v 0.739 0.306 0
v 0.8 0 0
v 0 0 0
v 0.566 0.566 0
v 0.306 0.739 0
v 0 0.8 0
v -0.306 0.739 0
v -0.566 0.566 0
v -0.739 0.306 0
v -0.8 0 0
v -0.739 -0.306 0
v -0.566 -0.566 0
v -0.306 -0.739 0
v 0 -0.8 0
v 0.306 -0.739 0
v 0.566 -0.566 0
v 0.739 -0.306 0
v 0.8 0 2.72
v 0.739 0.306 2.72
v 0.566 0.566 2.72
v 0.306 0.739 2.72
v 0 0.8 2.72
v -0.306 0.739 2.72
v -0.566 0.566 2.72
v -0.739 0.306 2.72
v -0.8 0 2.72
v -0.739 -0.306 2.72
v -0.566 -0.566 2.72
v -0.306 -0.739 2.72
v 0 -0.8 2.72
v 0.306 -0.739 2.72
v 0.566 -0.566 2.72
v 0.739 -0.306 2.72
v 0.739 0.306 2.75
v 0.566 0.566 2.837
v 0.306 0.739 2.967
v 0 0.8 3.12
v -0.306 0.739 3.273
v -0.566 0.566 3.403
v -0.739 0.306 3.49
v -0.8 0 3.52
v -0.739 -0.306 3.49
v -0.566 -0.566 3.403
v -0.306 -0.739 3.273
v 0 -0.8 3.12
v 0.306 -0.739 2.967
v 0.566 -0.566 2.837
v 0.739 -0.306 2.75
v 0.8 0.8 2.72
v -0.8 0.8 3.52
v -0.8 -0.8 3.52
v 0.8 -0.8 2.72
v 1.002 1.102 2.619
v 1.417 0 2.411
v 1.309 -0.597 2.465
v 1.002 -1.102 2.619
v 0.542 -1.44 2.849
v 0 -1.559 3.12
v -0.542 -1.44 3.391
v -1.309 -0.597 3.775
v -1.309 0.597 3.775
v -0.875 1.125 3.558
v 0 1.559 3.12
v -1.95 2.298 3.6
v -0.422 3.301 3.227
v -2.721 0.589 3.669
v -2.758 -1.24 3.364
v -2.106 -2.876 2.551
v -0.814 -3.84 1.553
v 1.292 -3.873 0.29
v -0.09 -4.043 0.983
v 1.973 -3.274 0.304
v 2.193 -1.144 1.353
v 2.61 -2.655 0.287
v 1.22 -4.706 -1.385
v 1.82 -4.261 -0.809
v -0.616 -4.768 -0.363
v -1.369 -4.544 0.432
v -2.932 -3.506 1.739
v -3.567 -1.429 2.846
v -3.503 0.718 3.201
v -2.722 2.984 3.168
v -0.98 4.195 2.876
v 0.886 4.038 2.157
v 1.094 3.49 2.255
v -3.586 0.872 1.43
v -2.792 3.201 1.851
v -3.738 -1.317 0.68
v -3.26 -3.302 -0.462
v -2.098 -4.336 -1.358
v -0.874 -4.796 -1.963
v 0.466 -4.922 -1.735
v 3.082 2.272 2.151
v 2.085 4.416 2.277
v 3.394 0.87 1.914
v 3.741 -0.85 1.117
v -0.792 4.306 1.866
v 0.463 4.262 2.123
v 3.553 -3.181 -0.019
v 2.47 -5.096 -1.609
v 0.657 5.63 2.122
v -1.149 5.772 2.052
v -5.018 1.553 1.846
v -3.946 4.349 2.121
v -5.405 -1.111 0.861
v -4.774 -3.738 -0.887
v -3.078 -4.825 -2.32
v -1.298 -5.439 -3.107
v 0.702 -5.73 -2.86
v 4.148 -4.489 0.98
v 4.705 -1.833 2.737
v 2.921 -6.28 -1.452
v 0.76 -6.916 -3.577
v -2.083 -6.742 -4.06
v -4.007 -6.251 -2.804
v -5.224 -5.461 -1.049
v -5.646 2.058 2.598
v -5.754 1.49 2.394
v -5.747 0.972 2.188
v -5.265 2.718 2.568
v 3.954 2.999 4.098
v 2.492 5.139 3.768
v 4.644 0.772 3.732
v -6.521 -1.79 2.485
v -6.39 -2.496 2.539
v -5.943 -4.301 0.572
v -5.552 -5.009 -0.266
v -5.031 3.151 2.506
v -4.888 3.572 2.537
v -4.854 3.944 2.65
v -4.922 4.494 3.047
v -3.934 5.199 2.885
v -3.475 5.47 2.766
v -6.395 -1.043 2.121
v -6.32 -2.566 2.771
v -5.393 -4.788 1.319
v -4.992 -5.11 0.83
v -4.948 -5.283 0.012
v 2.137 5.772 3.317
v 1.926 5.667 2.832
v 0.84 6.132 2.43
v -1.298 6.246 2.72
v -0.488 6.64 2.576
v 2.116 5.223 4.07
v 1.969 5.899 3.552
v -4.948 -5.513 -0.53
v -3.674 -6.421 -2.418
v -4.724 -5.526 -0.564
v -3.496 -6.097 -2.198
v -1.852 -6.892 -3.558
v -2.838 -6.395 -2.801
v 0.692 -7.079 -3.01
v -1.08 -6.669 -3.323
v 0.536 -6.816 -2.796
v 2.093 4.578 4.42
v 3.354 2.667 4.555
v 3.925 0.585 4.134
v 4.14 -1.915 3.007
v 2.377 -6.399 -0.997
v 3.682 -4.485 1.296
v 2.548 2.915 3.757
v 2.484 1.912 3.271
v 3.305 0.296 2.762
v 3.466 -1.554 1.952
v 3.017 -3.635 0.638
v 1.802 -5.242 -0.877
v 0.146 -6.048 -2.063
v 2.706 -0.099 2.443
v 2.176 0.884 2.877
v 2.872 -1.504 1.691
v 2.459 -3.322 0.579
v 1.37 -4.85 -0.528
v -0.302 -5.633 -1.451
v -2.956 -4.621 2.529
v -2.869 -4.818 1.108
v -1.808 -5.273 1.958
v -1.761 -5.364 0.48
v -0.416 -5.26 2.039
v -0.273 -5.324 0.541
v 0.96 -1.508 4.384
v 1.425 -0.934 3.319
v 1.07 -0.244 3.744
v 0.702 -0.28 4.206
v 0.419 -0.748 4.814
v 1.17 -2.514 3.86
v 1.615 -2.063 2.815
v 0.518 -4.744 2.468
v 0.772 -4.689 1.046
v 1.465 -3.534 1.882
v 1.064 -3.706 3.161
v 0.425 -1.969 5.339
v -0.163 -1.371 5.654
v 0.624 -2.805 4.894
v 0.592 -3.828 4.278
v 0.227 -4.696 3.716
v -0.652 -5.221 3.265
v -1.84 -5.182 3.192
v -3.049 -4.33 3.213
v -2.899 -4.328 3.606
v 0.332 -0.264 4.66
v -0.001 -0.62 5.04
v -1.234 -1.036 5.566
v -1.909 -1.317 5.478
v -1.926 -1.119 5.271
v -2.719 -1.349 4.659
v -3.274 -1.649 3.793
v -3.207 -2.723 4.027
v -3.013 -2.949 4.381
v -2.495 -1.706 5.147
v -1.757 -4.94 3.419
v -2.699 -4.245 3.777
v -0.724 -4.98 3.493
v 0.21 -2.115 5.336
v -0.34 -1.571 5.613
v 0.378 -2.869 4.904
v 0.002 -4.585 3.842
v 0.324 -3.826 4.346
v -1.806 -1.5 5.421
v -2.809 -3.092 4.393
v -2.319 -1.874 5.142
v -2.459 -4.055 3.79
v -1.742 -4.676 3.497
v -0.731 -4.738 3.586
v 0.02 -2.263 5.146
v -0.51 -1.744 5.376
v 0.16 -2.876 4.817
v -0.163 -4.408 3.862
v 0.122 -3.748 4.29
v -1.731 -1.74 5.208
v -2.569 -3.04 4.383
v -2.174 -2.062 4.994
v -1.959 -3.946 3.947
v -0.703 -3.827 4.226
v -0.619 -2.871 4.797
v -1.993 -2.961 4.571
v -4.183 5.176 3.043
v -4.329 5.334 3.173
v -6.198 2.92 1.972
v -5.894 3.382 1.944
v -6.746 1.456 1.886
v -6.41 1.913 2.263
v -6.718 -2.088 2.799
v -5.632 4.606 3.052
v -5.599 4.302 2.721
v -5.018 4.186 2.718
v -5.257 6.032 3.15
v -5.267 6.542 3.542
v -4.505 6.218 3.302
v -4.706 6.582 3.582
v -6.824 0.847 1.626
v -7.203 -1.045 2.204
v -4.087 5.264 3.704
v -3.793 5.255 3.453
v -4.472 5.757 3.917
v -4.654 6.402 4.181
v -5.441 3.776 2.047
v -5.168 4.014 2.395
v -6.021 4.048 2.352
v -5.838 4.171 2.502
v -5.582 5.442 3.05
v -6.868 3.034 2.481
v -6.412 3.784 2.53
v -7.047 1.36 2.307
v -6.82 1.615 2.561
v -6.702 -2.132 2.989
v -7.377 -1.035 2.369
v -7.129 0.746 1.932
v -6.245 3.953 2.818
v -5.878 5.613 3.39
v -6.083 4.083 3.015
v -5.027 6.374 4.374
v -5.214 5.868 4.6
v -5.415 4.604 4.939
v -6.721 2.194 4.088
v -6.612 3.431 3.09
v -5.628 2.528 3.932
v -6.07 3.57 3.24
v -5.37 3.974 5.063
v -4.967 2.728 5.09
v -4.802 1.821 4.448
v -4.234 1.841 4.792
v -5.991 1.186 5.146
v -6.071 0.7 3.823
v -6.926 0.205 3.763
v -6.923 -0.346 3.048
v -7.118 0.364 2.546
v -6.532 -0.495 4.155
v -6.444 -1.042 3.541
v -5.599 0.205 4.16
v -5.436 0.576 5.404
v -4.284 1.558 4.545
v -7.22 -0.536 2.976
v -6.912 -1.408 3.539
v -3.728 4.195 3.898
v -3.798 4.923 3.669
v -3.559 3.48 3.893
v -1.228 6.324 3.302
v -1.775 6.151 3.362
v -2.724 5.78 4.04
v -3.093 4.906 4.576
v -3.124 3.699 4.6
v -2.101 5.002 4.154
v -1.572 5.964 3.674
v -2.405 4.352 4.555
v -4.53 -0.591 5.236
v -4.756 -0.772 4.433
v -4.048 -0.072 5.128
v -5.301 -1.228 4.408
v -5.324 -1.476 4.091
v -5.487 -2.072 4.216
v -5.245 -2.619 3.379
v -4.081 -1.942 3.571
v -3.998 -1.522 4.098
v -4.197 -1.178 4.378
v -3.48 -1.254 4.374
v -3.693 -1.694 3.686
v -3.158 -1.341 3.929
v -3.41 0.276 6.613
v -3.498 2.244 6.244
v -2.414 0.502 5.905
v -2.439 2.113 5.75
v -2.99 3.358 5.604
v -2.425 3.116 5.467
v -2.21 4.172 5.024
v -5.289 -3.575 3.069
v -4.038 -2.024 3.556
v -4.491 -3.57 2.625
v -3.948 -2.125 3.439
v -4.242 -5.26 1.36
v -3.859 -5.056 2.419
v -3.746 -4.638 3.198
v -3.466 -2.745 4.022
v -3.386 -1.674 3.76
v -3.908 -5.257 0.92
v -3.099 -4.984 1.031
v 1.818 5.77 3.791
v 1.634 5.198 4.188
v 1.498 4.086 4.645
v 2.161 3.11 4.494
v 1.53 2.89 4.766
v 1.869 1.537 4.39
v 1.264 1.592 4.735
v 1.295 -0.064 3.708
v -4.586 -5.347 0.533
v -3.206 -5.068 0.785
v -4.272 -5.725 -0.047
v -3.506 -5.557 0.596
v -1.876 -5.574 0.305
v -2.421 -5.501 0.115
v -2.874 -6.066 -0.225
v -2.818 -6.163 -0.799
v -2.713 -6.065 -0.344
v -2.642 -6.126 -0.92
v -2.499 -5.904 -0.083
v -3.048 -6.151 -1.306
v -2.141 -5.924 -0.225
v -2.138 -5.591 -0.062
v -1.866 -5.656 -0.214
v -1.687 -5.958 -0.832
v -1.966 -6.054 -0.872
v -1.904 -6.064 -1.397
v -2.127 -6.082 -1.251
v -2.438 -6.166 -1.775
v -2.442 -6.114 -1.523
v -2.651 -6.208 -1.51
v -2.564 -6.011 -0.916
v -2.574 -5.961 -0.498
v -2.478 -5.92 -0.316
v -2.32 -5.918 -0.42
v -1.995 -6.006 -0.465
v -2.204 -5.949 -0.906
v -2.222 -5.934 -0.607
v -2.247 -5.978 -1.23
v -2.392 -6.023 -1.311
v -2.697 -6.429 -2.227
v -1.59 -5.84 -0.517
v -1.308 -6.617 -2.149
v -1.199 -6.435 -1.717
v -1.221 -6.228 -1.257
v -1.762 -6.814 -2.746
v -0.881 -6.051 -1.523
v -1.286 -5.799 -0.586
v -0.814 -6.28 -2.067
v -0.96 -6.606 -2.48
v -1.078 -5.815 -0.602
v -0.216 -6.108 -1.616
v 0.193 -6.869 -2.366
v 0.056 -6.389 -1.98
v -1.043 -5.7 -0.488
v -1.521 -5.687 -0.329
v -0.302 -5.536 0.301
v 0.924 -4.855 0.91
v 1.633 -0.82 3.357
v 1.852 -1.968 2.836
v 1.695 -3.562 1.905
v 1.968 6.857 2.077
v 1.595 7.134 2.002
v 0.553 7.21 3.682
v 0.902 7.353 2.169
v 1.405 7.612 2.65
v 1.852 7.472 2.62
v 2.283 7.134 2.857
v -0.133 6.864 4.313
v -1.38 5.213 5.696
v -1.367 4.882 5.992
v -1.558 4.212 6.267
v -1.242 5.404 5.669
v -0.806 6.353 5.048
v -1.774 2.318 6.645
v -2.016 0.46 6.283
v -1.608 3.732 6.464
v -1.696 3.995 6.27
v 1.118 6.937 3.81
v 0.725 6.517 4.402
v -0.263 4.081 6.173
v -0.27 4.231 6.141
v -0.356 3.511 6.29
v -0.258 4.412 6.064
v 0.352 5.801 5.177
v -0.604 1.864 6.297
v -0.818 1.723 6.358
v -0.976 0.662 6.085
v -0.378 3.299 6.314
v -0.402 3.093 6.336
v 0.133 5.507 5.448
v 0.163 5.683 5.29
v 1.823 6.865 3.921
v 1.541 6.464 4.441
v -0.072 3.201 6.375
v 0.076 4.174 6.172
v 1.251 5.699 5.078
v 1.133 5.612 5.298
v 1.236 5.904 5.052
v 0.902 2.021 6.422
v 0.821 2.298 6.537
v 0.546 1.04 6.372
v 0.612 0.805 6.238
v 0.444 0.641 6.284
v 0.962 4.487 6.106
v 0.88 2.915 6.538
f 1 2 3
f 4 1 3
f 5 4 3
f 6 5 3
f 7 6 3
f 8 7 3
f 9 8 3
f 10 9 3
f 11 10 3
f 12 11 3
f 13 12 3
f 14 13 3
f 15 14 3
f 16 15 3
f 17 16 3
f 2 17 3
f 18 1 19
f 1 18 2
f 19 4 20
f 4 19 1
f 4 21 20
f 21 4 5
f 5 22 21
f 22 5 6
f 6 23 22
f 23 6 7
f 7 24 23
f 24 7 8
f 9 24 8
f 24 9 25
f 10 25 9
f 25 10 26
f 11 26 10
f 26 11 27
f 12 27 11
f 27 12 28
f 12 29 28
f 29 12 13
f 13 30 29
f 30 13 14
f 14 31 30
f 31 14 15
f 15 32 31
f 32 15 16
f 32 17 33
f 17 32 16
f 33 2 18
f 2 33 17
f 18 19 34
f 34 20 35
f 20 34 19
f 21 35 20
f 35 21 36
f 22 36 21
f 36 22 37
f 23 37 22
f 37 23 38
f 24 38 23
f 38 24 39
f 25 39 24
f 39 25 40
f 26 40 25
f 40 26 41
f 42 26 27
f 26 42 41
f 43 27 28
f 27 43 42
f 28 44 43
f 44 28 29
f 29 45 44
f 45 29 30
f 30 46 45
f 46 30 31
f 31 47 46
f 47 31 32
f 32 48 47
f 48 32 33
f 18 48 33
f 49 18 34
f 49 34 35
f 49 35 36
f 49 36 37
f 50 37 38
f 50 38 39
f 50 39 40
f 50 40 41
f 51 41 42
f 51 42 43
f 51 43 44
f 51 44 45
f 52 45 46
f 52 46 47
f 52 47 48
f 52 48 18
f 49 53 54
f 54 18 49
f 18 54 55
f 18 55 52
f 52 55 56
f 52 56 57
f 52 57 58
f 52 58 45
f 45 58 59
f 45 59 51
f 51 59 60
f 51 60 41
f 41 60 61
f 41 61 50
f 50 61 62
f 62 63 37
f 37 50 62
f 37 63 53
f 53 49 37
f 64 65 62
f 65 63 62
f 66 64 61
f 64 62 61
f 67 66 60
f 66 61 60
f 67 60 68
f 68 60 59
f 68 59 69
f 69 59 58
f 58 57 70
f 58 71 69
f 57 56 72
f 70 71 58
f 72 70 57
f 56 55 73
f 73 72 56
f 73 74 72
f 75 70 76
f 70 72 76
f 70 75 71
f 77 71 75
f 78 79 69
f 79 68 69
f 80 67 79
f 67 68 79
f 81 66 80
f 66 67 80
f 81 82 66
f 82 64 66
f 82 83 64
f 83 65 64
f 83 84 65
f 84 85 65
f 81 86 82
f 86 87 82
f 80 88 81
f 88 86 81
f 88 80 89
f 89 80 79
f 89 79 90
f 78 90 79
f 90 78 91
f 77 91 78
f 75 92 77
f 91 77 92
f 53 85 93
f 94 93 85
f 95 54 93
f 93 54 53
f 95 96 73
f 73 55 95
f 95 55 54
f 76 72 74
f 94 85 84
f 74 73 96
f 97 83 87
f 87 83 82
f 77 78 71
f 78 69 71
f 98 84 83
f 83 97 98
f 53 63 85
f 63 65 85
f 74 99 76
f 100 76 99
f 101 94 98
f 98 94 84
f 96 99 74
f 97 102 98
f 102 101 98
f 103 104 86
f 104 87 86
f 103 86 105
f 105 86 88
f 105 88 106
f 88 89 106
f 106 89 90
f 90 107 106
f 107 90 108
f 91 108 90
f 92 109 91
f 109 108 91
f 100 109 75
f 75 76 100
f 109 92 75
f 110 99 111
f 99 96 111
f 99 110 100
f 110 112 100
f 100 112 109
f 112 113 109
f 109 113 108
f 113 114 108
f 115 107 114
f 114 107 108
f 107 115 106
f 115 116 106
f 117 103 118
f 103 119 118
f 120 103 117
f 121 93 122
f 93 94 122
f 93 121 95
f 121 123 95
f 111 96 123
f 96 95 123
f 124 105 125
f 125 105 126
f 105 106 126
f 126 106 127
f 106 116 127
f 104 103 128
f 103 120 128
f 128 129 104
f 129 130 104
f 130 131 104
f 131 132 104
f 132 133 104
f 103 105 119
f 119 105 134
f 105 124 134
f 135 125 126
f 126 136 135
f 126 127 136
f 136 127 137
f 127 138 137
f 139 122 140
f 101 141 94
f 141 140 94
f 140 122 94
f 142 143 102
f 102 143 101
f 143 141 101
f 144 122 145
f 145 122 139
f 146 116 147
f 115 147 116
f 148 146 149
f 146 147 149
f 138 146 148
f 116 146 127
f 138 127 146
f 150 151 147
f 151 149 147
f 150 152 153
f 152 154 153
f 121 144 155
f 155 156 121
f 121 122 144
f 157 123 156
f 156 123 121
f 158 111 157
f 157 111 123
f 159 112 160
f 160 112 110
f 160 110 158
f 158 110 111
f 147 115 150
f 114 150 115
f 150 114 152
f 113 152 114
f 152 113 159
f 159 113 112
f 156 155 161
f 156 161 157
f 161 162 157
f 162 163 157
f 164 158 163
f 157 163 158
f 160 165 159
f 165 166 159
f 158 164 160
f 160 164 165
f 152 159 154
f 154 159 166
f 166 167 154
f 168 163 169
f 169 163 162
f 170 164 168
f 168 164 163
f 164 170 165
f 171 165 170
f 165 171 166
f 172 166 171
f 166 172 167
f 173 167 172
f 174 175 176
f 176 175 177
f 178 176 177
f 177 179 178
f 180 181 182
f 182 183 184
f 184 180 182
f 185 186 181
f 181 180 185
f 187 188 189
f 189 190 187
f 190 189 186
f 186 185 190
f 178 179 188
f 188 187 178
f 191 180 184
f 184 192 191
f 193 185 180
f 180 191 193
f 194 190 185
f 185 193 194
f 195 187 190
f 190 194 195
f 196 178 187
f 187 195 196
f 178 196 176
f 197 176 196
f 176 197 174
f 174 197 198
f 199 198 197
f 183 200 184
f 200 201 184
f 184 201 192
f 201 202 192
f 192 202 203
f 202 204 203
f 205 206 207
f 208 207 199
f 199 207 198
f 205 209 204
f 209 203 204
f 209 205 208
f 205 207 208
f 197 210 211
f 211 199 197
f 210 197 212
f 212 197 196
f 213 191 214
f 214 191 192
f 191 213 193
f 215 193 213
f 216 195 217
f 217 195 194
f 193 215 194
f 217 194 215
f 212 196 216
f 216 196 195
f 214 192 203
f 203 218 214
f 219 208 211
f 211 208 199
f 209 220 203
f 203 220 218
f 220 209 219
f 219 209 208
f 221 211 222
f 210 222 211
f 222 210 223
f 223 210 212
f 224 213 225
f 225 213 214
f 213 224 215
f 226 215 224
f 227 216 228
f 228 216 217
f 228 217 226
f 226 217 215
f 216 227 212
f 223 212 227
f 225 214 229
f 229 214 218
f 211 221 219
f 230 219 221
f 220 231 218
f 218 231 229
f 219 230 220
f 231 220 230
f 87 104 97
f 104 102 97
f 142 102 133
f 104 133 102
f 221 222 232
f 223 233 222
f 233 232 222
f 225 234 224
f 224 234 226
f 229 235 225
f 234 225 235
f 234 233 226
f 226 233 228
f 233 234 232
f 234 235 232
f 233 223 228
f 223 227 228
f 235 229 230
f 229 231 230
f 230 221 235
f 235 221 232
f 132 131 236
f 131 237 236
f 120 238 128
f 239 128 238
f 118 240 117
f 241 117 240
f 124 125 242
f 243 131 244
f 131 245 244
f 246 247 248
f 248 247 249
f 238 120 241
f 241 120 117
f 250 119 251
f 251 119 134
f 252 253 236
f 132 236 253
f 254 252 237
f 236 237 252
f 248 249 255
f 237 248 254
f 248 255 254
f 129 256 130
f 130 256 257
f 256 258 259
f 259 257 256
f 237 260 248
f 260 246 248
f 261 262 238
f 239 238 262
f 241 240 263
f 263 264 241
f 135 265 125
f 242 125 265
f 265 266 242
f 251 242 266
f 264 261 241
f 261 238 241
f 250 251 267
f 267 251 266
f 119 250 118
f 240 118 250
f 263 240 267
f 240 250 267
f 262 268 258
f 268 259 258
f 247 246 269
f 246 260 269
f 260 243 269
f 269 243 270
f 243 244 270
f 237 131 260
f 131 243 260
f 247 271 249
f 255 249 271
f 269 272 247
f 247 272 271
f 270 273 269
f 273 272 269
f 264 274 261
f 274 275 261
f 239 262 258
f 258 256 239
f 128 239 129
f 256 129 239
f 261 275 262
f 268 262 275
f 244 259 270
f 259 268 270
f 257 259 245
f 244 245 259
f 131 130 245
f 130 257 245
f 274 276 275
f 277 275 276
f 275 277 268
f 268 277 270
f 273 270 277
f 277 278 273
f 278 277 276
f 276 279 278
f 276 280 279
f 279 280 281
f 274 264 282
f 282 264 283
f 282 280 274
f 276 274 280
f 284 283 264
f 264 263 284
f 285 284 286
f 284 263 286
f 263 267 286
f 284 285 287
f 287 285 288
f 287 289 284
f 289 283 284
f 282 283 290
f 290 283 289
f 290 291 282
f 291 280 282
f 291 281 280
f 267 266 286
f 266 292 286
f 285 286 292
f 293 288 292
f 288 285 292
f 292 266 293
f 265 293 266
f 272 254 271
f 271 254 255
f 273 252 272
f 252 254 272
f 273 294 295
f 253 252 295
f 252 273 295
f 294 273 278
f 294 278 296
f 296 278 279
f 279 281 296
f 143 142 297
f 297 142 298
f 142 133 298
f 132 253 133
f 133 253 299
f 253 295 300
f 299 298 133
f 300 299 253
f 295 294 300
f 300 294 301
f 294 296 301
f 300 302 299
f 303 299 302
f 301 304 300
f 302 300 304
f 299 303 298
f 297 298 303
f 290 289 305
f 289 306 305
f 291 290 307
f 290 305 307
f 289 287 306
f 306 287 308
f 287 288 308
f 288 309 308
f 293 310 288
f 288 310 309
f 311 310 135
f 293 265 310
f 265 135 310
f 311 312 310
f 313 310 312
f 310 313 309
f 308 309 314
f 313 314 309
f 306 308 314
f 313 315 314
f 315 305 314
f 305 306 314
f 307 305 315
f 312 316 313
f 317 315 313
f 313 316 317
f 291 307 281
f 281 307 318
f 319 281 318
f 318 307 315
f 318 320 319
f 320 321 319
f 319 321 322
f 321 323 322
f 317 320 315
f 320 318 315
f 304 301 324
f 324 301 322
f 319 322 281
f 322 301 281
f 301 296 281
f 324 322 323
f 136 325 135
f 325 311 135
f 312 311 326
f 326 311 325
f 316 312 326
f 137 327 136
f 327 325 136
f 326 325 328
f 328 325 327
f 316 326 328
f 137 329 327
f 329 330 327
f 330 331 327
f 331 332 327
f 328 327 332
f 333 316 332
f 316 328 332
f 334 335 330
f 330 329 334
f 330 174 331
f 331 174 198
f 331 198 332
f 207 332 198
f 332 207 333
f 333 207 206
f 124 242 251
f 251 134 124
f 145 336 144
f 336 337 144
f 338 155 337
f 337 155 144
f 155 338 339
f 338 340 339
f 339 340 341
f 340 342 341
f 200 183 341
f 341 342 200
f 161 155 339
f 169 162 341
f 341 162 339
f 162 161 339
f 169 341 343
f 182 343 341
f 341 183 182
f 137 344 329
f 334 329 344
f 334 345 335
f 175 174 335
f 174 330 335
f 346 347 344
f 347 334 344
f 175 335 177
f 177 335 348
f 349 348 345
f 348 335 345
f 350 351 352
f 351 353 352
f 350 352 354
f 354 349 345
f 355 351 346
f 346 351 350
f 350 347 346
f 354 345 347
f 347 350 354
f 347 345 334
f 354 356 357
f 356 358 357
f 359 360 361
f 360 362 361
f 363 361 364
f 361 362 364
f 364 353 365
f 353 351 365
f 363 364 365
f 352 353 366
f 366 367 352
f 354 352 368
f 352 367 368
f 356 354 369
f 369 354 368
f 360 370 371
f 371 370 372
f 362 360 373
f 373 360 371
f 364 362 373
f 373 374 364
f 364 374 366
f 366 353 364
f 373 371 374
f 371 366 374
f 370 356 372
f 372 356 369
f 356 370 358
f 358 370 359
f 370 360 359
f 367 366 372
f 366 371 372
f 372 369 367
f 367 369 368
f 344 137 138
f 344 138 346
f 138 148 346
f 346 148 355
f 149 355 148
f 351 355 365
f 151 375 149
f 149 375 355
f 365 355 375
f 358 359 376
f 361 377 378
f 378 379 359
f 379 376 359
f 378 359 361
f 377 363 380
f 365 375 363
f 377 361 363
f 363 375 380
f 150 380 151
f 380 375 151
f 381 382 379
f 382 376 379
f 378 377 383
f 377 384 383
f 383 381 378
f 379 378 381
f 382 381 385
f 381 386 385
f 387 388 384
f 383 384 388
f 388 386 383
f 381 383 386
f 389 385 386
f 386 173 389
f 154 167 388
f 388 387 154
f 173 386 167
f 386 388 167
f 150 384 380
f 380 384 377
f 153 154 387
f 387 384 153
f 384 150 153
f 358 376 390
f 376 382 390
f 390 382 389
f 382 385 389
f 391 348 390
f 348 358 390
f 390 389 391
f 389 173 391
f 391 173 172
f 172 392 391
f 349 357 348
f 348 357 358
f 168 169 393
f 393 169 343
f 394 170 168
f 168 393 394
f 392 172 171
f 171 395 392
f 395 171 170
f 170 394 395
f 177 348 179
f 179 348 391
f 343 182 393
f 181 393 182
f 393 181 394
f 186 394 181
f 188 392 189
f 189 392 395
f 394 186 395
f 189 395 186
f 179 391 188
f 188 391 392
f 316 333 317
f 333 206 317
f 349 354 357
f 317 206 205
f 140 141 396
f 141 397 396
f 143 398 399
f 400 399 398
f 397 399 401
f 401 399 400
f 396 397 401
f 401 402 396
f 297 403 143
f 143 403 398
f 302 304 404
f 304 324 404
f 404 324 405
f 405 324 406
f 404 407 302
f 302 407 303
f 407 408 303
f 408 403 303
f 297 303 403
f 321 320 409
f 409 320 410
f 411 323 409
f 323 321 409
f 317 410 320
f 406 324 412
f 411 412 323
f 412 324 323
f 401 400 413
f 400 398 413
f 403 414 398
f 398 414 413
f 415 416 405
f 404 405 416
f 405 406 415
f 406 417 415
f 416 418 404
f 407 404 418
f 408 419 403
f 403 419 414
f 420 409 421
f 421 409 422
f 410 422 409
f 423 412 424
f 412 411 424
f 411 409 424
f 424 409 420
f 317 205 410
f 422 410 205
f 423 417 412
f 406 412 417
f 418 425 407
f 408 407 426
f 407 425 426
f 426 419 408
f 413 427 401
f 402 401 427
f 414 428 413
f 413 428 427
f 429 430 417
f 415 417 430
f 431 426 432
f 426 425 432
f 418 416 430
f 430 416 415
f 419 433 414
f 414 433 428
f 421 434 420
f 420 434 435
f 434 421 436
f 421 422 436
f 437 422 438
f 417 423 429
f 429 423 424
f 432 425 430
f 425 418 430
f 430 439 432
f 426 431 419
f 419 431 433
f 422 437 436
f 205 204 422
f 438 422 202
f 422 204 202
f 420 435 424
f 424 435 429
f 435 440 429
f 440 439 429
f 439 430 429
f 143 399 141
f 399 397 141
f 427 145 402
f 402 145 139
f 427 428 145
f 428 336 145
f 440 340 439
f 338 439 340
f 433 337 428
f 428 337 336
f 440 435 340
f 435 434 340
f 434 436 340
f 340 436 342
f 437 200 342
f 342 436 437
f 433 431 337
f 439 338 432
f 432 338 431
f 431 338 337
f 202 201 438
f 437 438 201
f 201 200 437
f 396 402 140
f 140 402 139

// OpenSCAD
use <../lib.scad>
use <s/13746s01.scad>
use <s/13746s02.scad>
use <s/13746s03.scad>
function ldraw_lib__13746p02() = [
// 0 Minifig Hat with Small Pin, Women's Fedora with Large Red Bow and Red Feather Pattern
// 0 Name: 13746p02.dat
// 0 Author: Lisa Winter [LisaWinter]
// 0 !LDRAW_ORG Part UPDATE 2024-08
// 0 !LICENSE Licensed under CC BY 4.0 : see CAreadme.txt
// 
// 0 BFC CERTIFY CCW
  [0,"BFC","CERTIFY"],
  [0,"BFC","CCW"],
// 
// 0 !KEYWORDS Bricklink 13746pb002, Calamity Drone, CMF, Collectible Minifigures
// 0 !KEYWORDS Rebrickable 13746pr0002, set 71004, The LEGO Movie
// 
// 0 !HISTORY 2013-08-14 {LEGO Digital Designer} Original part shape
// 0 !HISTORY 2024-09-04 [LisaWinter] File preparation for LDraw Parts Tracker
// 0 !HISTORY 2024-09-30 [OrionP] Official Update 2024-08
// 
// 0 // Main part
// 1 16 0 0 0 1 0 0 0 1 0 0 0 1 s\13746s01.dat
  [1,16,0,0,0,1,0,0,0,1,0,0,0,1, ldraw_lib__s__13746s01()],
// 0 // Bow
// 1 4 0 0 0 1 0 0 0 1 0 0 0 1 s\13746s02.dat
  [1,4,0,0,0,1,0,0,0,1,0,0,0,1, ldraw_lib__s__13746s02()],
// 0 // Feather
// 1 4 0 0 0 1 0 0 0 1 0 0 0 1 s\13746s03.dat
  [1,4,0,0,0,1,0,0,0,1,0,0,0,1, ldraw_lib__s__13746s03()],
];
module ldraw_lib__13746p02(step=0, col=false, unit=2/5, alt=false, line=0.2, solid=!$preview)
    makepoly(ldraw_lib__13746p02(), step=step, col=col, unit=unit, alt=alt, line=line, solid=solid);
ldraw_lib__13746p02(line=0.2);
